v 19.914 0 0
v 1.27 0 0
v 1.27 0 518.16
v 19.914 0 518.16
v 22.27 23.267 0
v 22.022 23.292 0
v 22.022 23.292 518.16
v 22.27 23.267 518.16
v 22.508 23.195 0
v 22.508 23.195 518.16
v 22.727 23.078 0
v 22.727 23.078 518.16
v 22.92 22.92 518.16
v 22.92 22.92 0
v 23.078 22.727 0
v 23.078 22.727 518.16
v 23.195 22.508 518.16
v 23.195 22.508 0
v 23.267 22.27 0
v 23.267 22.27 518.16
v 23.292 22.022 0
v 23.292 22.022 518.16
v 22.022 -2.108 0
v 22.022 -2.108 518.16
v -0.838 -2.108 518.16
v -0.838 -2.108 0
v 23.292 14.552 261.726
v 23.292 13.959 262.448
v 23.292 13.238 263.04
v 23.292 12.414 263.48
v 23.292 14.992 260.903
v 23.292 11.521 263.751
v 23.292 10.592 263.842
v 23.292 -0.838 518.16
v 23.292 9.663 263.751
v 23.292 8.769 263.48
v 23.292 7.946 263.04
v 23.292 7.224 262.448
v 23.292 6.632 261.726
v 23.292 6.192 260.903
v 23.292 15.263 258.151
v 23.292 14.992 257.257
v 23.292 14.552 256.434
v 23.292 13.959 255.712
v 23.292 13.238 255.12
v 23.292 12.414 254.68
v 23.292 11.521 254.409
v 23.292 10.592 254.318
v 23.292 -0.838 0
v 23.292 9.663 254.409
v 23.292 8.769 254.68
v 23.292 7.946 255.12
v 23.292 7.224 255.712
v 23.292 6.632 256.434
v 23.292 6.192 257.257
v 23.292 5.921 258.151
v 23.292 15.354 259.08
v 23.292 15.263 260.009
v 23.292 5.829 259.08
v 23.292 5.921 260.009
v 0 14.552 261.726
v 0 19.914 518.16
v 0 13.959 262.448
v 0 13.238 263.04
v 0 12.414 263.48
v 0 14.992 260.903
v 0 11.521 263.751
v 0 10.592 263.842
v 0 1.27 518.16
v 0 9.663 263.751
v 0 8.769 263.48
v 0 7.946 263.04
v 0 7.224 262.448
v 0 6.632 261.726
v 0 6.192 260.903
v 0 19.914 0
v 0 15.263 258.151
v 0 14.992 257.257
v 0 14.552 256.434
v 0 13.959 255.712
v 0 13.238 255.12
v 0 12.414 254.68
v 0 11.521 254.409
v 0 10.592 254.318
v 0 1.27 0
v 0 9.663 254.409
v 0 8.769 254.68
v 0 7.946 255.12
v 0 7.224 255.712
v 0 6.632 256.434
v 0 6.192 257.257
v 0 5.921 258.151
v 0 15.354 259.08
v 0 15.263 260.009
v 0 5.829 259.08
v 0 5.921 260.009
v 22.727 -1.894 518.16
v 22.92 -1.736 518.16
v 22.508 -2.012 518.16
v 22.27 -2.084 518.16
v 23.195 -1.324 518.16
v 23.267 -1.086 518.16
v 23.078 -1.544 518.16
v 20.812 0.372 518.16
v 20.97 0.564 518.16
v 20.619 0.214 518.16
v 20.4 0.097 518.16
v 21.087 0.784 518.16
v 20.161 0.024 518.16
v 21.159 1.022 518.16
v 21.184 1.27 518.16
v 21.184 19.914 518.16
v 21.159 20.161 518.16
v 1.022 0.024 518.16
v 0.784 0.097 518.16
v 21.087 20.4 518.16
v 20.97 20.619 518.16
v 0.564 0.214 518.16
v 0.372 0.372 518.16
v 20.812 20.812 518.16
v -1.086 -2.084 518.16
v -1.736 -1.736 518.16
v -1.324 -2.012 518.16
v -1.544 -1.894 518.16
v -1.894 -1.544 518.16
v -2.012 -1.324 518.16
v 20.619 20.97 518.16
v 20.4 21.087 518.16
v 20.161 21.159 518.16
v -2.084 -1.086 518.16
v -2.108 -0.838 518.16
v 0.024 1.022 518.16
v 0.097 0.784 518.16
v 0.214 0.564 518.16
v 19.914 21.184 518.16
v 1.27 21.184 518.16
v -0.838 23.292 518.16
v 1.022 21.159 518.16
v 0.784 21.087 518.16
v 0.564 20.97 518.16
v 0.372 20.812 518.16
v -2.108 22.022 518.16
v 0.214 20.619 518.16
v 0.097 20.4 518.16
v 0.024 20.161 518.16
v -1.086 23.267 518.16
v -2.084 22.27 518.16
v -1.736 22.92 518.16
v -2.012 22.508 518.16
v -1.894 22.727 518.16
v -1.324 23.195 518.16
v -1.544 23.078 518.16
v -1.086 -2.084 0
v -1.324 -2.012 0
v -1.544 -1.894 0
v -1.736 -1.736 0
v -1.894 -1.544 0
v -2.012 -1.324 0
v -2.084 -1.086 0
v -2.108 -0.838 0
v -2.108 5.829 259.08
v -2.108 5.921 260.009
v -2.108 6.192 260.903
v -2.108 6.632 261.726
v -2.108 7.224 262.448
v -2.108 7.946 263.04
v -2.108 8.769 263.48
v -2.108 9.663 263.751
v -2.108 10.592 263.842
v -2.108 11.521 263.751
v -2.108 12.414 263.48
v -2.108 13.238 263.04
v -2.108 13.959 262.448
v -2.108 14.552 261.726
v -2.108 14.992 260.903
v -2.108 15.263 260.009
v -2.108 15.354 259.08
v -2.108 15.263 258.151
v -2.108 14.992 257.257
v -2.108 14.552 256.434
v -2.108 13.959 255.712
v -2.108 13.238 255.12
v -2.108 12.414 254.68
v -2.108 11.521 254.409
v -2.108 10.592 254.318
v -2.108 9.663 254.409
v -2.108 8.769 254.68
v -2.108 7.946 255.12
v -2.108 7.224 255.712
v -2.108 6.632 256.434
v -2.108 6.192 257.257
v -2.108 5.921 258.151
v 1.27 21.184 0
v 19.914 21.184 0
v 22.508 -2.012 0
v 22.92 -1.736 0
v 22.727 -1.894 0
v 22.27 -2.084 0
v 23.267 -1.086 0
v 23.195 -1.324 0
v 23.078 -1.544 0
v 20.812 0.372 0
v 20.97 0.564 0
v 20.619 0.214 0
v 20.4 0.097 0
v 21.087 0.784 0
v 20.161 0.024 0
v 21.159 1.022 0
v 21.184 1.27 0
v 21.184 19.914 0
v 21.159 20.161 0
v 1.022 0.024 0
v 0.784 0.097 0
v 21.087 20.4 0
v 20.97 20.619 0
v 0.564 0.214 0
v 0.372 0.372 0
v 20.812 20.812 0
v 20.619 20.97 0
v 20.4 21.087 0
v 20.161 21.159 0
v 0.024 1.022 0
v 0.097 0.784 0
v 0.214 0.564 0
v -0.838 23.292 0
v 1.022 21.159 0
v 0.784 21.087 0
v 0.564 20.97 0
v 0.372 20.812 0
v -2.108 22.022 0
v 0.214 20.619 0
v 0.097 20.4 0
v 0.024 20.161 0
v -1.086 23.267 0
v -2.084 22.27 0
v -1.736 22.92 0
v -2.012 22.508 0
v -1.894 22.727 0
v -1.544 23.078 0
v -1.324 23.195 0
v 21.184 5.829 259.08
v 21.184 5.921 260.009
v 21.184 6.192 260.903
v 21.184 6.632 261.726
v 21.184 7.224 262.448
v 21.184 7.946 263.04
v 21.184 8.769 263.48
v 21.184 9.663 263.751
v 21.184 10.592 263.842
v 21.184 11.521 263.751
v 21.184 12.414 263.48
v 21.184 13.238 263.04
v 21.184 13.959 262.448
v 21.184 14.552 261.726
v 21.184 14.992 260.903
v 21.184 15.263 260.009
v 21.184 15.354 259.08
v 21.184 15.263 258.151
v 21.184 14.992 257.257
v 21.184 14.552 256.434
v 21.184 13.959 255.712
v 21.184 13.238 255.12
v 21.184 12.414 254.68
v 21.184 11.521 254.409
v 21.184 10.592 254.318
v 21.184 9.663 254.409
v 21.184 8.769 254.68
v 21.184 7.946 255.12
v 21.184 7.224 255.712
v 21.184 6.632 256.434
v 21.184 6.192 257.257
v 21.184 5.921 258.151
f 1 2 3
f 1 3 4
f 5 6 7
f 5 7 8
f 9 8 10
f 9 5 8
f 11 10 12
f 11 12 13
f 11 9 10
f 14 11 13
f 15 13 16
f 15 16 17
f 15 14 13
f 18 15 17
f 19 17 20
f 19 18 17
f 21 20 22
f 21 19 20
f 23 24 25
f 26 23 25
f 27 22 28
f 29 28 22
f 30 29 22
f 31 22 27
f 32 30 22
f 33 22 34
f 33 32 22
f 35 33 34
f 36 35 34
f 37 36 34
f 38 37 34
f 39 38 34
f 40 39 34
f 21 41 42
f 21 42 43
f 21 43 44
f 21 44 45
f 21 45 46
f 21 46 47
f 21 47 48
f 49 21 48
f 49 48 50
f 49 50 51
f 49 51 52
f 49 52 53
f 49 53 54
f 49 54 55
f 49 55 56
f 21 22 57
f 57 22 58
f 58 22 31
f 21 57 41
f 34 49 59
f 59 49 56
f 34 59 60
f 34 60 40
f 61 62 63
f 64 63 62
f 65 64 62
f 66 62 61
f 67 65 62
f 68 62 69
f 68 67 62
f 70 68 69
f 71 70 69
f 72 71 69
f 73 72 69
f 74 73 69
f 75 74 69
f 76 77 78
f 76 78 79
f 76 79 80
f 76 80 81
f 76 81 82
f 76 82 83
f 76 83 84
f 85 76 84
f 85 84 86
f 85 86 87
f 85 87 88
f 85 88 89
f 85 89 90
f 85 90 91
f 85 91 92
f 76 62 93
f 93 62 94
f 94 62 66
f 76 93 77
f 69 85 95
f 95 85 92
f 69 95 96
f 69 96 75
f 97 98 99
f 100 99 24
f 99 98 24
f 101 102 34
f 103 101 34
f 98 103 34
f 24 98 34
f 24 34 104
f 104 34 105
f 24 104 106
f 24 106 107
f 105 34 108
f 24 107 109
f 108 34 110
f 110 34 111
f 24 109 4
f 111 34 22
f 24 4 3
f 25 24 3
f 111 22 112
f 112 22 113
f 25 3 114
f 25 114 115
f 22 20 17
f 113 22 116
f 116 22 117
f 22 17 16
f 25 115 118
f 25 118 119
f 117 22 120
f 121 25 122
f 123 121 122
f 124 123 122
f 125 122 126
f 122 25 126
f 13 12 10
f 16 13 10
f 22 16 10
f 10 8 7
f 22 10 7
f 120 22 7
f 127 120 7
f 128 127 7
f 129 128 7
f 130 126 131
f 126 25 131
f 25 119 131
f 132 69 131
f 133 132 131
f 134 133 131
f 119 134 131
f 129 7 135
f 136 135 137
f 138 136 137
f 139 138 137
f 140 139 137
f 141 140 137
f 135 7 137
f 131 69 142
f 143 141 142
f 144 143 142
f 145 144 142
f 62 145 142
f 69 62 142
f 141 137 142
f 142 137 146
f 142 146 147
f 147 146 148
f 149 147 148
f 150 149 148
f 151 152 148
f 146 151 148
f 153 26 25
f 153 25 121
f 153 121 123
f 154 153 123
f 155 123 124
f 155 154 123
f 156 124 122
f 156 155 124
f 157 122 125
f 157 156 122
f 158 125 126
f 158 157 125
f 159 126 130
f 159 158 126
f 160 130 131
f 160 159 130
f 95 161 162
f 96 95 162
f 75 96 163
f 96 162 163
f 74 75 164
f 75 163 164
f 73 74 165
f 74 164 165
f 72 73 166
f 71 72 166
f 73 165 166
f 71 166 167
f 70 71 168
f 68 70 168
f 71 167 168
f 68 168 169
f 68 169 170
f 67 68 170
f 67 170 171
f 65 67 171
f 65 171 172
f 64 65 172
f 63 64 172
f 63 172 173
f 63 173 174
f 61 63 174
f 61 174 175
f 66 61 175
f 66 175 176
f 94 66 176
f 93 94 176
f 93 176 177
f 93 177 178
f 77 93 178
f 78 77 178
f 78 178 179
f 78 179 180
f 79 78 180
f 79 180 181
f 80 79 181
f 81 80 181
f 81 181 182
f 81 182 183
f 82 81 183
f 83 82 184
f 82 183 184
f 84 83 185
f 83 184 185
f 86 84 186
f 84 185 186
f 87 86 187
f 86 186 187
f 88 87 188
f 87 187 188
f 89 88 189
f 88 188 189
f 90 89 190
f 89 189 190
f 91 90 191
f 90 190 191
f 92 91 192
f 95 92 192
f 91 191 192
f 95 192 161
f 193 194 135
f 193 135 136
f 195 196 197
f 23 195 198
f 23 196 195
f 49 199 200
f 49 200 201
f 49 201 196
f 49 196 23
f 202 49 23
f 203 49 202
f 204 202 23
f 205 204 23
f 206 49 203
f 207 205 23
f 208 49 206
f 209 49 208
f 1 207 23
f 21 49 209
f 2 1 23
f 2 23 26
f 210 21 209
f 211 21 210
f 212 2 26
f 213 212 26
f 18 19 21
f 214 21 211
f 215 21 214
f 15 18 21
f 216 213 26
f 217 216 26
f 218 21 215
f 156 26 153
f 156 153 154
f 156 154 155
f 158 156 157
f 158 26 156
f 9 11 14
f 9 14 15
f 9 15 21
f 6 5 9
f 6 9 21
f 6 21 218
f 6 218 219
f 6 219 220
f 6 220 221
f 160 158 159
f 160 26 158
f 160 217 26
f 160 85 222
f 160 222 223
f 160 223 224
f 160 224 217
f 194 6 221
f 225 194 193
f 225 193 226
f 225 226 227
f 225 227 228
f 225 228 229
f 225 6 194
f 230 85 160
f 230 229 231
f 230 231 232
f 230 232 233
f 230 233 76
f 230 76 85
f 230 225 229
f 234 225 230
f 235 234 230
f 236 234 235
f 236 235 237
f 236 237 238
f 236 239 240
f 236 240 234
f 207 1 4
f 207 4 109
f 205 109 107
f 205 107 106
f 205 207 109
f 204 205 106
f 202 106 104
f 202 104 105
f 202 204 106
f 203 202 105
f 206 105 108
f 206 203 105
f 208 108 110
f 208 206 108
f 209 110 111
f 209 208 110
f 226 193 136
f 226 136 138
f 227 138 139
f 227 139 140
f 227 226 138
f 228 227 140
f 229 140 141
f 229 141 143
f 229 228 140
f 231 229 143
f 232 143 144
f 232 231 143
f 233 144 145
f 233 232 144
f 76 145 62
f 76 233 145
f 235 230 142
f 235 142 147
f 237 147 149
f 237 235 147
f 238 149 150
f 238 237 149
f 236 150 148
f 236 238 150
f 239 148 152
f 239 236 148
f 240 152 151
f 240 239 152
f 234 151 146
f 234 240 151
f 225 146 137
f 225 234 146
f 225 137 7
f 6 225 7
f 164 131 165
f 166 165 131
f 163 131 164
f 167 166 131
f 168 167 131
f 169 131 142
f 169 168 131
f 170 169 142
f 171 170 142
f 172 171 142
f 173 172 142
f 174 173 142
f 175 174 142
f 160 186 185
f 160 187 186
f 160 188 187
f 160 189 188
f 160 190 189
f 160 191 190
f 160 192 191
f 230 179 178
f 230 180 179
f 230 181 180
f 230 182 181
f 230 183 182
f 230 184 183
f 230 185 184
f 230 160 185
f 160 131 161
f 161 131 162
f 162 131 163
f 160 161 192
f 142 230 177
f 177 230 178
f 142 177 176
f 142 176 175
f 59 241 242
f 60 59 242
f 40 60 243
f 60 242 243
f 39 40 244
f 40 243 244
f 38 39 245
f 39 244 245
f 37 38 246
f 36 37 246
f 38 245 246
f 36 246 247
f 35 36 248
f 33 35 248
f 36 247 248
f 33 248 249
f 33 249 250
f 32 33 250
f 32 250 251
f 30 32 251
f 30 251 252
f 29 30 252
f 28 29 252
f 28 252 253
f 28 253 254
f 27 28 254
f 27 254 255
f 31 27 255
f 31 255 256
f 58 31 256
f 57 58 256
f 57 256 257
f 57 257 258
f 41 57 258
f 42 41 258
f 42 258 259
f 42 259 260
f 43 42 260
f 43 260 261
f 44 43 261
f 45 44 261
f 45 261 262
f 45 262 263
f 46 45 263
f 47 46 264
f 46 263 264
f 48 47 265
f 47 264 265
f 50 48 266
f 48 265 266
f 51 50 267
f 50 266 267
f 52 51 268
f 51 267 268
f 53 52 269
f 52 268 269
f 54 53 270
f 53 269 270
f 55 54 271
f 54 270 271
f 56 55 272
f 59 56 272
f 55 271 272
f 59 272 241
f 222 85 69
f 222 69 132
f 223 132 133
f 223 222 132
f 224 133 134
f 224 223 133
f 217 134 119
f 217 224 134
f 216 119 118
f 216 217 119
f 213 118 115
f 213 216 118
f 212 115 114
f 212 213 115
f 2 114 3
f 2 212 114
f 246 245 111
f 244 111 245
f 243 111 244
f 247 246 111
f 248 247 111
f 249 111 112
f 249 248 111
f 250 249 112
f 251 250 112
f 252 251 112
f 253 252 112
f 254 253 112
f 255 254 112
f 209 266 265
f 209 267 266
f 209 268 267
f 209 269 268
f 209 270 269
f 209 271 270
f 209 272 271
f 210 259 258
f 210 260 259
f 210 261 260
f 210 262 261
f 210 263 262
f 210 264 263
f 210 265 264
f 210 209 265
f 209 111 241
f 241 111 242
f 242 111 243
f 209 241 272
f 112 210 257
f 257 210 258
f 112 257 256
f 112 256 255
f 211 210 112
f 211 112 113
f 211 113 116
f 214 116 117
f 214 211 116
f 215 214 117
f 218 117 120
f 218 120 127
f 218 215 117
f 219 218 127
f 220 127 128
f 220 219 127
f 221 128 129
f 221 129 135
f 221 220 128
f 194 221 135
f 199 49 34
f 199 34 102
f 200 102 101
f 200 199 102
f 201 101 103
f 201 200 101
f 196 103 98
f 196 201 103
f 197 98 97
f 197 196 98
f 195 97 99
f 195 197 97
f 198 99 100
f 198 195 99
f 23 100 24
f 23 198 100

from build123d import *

# Parameters (mm, degrees)
BOSS_EXTRUDE1_DEPTH = 518.16
SKETCH2_R           = 4.7625
CUT_EXTRUDE1_DEPTH  = 520.304779053


with BuildPart() as part:
    # Sketch1 → Boss-Extrude1 (new body)
    with BuildSketch(Plane.XY):
        with BuildLine():
            Line((-0.8382, 23.2918), (22.0218, 23.2918))
            ThreePointArc((22.0218, 23.2918), (22.919825612, 22.919825612), (23.2918, 22.0218))
            Line((23.2918, 22.0218), (23.2918, -0.8382))
            ThreePointArc((23.2918, -0.8382), (22.919825612, -1.736225612), (22.0218, -2.1082))
            Line((22.0218, -2.1082), (-0.8382, -2.1082))
            ThreePointArc((-0.8382, -2.1082), (-1.736225612, -1.736225612), (-2.1082, -0.8382))
            Line((-2.1082, -0.8382), (-2.1082, 22.0218))
            ThreePointArc((-2.1082, 22.0218), (-1.736225612, 22.919825612), (-0.8382, 23.2918))
        make_face()
        with BuildLine():
            Line((1.27, 0), (19.9136, 0))
            ThreePointArc((19.9136, 0), (20.811625612, 0.371974388), (21.1836, 1.27))
            Line((21.1836, 1.27), (21.1836, 19.9136))
            ThreePointArc((21.1836, 19.9136), (20.811625612, 20.811625612), (19.9136, 21.1836))
            Line((19.9136, 21.1836), (1.27, 21.1836))
            ThreePointArc((1.27, 21.1836), (0.371974388, 20.811625612), (0, 19.9136))
            Line((0, 19.9136), (0, 1.27))
            ThreePointArc((0, 1.27), (0.371974388, 0.371974388), (1.27, 0))
        make_face(mode=Mode.SUBTRACT)
    extrude(amount=BOSS_EXTRUDE1_DEPTH)

    # Sketch2 → Cut-Extrude1 (cut, through all)
    with BuildSketch(Plane.ZY.offset(2.1082)):
        with Locations(Location((259.08, 10.5918, 0), (0, 0, 270))):
            Circle(SKETCH2_R)
    extrude(amount=-CUT_EXTRUDE1_DEPTH, mode=Mode.SUBTRACT)


solid = part.part
